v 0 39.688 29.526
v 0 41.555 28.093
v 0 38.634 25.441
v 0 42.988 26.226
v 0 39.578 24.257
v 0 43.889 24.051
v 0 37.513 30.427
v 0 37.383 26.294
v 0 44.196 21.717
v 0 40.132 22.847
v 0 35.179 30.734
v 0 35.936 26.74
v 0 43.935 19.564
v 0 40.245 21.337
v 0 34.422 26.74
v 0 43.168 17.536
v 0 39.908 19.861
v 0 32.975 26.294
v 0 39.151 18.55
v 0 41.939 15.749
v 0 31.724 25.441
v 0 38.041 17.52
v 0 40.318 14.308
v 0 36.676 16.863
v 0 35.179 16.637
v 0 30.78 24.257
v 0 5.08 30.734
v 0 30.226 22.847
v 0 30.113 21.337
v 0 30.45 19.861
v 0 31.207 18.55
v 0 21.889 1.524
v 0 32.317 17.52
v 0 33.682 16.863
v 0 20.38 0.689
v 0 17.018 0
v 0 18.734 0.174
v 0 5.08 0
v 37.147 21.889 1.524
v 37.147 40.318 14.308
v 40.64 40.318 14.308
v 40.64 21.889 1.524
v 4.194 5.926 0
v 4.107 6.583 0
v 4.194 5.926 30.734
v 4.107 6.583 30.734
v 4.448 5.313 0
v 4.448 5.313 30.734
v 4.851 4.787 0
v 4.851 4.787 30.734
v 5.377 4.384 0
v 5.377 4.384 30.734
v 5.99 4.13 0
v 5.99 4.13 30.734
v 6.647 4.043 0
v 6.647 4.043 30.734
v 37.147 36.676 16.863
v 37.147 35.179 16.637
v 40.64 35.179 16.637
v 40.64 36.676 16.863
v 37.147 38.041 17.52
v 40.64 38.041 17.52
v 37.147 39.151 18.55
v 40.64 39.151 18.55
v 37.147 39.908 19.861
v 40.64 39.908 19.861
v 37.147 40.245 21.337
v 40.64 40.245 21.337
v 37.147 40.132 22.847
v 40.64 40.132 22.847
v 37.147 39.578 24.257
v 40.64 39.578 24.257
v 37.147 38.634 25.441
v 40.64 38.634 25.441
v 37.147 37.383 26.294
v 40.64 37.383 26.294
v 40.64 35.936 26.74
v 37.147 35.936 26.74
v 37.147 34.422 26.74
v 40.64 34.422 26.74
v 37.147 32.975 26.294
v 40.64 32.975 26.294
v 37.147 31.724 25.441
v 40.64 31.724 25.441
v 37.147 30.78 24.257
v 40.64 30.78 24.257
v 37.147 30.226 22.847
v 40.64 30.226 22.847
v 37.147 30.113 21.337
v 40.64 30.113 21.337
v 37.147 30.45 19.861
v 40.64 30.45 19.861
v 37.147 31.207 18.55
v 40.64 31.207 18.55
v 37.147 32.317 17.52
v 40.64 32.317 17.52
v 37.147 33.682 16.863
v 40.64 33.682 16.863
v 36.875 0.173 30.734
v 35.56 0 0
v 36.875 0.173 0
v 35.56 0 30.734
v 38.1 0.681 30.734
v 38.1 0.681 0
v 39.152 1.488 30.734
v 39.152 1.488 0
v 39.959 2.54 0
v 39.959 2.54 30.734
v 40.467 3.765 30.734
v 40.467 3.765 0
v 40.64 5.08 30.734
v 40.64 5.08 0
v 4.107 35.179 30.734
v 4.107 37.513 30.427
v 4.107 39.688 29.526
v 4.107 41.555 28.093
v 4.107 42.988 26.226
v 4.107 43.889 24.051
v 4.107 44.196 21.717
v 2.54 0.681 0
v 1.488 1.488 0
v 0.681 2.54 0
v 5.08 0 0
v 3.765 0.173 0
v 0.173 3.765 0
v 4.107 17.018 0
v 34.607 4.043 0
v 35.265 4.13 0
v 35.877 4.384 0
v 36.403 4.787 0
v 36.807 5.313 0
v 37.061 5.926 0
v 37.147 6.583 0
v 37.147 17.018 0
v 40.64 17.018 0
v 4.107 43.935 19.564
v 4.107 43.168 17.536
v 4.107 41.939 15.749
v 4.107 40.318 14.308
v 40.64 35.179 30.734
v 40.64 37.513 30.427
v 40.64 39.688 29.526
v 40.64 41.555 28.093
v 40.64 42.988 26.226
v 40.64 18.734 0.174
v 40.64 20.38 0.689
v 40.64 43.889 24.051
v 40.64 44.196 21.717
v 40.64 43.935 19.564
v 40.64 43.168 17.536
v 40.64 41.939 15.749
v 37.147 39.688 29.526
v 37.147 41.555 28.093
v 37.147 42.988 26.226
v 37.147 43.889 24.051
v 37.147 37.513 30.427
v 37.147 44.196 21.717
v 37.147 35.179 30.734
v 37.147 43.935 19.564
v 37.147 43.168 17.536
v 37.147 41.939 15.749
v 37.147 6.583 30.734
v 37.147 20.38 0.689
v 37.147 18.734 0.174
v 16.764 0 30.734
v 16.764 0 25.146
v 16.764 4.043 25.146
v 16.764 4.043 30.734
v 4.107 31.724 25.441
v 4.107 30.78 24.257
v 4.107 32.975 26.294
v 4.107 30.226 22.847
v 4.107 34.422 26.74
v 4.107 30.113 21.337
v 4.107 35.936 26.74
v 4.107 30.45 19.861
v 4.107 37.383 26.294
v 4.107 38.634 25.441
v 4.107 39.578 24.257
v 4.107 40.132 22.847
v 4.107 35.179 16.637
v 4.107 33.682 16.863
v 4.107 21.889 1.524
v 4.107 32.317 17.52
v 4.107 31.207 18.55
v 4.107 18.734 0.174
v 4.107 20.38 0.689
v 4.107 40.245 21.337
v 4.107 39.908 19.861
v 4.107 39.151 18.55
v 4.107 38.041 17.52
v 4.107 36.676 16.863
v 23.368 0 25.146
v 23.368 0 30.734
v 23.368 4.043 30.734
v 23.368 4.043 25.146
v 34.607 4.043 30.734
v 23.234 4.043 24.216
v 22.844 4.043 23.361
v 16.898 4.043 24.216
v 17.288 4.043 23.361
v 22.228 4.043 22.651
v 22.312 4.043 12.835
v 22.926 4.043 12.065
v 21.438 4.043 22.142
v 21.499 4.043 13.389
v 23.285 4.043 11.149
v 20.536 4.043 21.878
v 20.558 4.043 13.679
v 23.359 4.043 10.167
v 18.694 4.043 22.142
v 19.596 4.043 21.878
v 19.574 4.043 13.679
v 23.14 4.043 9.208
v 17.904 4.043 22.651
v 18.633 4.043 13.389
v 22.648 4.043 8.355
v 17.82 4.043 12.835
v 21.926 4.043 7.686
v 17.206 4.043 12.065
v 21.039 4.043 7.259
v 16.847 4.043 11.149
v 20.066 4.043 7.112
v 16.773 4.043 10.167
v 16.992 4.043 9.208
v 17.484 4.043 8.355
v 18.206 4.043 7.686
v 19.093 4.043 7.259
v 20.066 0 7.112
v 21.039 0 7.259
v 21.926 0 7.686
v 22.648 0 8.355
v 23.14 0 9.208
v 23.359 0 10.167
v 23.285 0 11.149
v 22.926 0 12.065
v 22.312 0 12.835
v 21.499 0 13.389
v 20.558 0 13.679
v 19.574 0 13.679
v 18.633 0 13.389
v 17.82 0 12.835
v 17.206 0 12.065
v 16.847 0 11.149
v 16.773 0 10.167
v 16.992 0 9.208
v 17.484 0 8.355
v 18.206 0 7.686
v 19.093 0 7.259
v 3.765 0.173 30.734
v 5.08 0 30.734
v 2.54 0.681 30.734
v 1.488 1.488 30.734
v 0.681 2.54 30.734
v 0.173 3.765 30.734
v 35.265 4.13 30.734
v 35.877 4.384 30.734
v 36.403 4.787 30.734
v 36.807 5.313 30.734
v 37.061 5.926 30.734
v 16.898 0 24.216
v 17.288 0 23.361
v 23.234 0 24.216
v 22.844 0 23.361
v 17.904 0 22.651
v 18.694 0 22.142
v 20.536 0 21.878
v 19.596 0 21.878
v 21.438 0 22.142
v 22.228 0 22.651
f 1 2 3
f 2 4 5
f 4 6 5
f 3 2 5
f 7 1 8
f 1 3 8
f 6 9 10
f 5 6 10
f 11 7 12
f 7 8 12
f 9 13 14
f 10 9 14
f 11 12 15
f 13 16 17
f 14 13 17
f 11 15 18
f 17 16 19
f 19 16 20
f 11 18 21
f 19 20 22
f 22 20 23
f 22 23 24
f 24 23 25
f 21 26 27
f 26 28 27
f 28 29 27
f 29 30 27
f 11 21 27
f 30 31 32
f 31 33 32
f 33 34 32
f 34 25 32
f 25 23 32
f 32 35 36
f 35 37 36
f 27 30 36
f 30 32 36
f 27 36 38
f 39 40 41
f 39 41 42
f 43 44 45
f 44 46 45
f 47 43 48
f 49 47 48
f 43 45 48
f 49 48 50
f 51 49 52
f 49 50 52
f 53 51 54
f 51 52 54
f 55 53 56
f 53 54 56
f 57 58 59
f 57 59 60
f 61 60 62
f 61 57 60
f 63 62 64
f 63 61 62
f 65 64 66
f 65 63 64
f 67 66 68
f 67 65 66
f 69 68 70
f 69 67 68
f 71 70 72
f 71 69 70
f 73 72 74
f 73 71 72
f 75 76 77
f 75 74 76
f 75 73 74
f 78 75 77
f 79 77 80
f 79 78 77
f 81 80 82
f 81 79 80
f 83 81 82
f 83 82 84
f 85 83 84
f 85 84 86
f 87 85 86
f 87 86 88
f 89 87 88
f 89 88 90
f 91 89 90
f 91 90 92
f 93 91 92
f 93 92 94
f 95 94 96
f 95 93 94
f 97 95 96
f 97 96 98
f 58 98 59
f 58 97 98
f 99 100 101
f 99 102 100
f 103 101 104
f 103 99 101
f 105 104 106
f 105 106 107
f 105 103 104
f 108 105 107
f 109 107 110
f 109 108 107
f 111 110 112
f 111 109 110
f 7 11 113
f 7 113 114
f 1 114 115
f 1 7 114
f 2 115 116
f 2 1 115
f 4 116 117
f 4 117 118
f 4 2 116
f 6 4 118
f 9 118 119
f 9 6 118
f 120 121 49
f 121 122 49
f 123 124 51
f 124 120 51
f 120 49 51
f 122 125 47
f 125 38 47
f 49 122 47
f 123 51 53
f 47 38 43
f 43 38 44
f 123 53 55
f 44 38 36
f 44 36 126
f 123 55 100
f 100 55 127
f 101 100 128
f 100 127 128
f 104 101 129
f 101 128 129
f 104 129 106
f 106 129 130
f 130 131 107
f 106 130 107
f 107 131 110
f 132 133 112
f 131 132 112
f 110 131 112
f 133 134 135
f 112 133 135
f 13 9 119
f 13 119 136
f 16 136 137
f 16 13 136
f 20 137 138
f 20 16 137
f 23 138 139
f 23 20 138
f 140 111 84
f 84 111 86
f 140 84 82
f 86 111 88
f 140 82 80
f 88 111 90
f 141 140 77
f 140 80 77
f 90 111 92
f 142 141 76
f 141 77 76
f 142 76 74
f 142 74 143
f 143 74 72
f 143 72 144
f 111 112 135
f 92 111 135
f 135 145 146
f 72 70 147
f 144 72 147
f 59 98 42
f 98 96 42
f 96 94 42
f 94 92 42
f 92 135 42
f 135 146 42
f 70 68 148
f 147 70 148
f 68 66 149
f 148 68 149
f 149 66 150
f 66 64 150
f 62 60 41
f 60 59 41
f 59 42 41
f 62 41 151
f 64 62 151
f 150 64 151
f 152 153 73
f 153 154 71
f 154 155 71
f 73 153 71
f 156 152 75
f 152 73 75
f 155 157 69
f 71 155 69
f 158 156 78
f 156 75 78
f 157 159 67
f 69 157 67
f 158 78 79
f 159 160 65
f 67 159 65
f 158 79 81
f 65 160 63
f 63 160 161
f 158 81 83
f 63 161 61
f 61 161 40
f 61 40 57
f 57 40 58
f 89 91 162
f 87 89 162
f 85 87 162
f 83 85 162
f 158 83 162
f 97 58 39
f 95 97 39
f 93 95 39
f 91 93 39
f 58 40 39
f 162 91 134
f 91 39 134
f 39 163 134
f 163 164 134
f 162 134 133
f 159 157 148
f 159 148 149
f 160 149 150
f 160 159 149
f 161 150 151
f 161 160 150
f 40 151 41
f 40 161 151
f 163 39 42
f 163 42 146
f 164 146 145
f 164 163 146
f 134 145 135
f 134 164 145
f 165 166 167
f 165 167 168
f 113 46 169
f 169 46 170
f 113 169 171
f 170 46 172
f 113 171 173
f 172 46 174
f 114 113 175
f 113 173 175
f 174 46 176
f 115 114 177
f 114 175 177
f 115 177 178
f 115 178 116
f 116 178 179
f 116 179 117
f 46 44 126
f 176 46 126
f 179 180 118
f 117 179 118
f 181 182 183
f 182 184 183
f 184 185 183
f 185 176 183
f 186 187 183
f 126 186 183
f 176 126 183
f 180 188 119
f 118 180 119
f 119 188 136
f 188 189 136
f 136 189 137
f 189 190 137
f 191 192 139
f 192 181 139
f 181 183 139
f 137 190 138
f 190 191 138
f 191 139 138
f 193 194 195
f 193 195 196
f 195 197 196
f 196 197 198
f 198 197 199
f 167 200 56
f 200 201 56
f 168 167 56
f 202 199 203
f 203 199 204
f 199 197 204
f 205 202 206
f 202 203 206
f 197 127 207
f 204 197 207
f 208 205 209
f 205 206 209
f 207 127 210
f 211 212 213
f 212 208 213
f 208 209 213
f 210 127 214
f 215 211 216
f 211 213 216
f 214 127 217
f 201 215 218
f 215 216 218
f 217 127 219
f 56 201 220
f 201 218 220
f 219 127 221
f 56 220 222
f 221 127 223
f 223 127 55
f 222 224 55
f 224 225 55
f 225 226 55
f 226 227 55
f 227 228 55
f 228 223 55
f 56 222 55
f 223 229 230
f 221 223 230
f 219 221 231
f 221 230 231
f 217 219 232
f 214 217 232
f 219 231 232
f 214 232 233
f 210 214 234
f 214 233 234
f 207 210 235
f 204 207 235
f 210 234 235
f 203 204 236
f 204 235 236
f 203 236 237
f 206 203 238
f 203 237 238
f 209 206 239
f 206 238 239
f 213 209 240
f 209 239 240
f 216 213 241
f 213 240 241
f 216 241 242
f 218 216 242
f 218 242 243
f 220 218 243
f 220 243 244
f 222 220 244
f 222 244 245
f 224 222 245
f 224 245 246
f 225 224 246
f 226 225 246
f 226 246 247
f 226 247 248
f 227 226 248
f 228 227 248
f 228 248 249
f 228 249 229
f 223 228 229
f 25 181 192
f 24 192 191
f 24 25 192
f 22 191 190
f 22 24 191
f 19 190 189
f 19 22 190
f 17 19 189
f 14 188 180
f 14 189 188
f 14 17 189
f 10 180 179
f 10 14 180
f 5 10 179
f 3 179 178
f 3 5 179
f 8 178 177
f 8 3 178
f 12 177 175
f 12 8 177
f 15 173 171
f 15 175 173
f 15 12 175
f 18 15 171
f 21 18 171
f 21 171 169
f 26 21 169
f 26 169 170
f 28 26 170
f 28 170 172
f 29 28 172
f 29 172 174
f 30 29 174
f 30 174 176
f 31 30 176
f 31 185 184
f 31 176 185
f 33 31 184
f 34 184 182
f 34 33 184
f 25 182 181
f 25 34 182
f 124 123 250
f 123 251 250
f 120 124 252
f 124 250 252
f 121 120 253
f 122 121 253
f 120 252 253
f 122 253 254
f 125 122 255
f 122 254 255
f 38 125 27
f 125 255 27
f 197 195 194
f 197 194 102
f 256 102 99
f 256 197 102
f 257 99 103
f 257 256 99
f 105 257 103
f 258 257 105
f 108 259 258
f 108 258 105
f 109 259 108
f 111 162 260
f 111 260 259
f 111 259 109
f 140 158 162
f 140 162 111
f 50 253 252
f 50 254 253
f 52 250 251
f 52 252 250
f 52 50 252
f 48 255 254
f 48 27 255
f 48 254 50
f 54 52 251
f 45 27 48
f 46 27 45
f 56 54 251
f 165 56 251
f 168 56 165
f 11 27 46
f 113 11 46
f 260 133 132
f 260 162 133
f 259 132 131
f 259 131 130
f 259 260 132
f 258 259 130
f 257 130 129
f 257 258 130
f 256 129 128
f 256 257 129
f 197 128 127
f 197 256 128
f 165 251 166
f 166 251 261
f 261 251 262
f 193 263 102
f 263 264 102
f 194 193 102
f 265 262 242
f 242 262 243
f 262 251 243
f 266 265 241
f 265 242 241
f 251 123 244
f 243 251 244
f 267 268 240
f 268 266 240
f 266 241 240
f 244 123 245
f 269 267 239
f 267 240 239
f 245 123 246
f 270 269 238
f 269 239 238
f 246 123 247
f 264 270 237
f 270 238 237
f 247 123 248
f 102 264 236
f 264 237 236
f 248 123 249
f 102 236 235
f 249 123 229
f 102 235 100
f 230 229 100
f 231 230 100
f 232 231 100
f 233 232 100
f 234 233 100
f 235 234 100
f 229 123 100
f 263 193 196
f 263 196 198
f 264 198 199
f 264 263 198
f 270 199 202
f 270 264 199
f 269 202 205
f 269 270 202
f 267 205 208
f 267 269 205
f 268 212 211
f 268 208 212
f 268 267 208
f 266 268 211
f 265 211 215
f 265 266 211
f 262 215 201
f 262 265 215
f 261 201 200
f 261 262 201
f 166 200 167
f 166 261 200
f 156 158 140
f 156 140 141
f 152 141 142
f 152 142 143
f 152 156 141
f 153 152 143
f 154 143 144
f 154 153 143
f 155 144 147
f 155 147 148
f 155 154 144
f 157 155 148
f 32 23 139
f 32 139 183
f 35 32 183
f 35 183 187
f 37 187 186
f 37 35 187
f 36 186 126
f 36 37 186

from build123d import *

# Parameters (mm, degrees)
BOSS_EXTRUDE1_DEPTH      = 30.734
SKETCH2_R                = 3.302
CUT_EXTRUDE3_DEPTH       = 45.196
FILLET3_R                = 5.08
FILLET4_R                = 2.54
SKETCH3_R                = 5.08
CUT_EXTRUDE5_DEPTH       = 41.64
CUT_EXTRUDE5_DEPTH_BACK  = 1
CUT_EXTRUDE14_DEPTH      = 41.64
CUT_EXTRUDE14_DEPTH_BACK = 1


with BuildPart() as part:
    # Sketch1 → Boss-Extrude1 (new body)
    with BuildSketch(Plane.XY):
        Polygon((0, 0), (40.64, 0), (40.64, 44.196), (37.147341265, 44.196), (37.147341265, 4.043206852), (4.107237524, 4.043206852), (4.107237524, 44.196), (0, 44.196), align=None)
    extrude(amount=BOSS_EXTRUDE1_DEPTH)

    # Sketch2 → Cut-Extrude3 (cut, through all)
    with BuildSketch(Plane.XZ):
        with Locations(Location((20.066, 10.414, 0), (0, 0, 270))):  # turned: the seam where the file's is
            Circle(SKETCH2_R)
        with BuildLine():
            Line((16.764, 30.734), (23.368, 30.734))
            Line((23.368, 30.734), (23.368, 25.146))
            ThreePointArc((23.368, 25.146), (20.066, 21.844), (16.764, 25.146))
            Line((16.764, 25.146), (16.764, 30.734))
        make_face()
    extrude(amount=-CUT_EXTRUDE3_DEPTH, mode=Mode.SUBTRACT)

    # Fillet3
    fillet3_edges = [part.edges().sort_by_distance(p)[0] for p in [
        (40.64, 0, 15.367),
        (0, 0, 15.367),
    ]]
    fillet(fillet3_edges, radius=FILLET3_R)

    # Fillet4
    fillet4_edges = [part.edges().sort_by_distance(p)[0] for p in [
        (4.107237524, 4.043206852, 15.367),
        (37.147341265, 4.043206852, 15.367),
    ]]
    fillet(fillet4_edges, radius=FILLET4_R)

    # Sketch3 → Cut-Extrude5 (cut, two sides)
    with BuildSketch(Plane(origin=(0, 0, 0), x_dir=(0, 0, -1), z_dir=(1, 0, 0))) as cut_extrude5_sk:
        with Locations((-21.717, 35.179)):
            Circle(SKETCH3_R)
    extrude(amount=CUT_EXTRUDE5_DEPTH, mode=Mode.SUBTRACT)
    extrude(cut_extrude5_sk.sketch, amount=-CUT_EXTRUDE5_DEPTH_BACK, mode=Mode.SUBTRACT)

    # Sketch6 → Cut-Extrude14 (cut, two sides)
    with BuildSketch(Plane(origin=(0, 0, 0), x_dir=(0, 0, -1), z_dir=(1, 0, 0))) as cut_extrude14_sk:
        with BuildLine():
            Line((-30.734, 44.196), (-30.734, 35.179))
            ThreePointArc((-30.734, 35.179), (-28.092981846, 41.554981846), (-21.717, 44.196))
            Line((-21.717, 44.196), (-30.734, 44.196))
        make_face()
        with BuildLine():
            Line((0, 44.196), (-21.717, 44.196))
            ThreePointArc((-21.717, 44.196), (-17.535826364, 43.167997185), (-14.308020426, 40.318388162))
            Line((-14.308020426, 40.318388162), (-1.524, 21.888850787))
            ThreePointArc((-1.524, 21.888850787), (-0.389894225, 19.569850475), (0, 17.018))
            Line((0, 17.018), (0, 44.196))
        make_face()
    extrude(amount=CUT_EXTRUDE14_DEPTH, mode=Mode.SUBTRACT)
    extrude(cut_extrude14_sk.sketch, amount=-CUT_EXTRUDE14_DEPTH_BACK, mode=Mode.SUBTRACT)


solid = part.part
